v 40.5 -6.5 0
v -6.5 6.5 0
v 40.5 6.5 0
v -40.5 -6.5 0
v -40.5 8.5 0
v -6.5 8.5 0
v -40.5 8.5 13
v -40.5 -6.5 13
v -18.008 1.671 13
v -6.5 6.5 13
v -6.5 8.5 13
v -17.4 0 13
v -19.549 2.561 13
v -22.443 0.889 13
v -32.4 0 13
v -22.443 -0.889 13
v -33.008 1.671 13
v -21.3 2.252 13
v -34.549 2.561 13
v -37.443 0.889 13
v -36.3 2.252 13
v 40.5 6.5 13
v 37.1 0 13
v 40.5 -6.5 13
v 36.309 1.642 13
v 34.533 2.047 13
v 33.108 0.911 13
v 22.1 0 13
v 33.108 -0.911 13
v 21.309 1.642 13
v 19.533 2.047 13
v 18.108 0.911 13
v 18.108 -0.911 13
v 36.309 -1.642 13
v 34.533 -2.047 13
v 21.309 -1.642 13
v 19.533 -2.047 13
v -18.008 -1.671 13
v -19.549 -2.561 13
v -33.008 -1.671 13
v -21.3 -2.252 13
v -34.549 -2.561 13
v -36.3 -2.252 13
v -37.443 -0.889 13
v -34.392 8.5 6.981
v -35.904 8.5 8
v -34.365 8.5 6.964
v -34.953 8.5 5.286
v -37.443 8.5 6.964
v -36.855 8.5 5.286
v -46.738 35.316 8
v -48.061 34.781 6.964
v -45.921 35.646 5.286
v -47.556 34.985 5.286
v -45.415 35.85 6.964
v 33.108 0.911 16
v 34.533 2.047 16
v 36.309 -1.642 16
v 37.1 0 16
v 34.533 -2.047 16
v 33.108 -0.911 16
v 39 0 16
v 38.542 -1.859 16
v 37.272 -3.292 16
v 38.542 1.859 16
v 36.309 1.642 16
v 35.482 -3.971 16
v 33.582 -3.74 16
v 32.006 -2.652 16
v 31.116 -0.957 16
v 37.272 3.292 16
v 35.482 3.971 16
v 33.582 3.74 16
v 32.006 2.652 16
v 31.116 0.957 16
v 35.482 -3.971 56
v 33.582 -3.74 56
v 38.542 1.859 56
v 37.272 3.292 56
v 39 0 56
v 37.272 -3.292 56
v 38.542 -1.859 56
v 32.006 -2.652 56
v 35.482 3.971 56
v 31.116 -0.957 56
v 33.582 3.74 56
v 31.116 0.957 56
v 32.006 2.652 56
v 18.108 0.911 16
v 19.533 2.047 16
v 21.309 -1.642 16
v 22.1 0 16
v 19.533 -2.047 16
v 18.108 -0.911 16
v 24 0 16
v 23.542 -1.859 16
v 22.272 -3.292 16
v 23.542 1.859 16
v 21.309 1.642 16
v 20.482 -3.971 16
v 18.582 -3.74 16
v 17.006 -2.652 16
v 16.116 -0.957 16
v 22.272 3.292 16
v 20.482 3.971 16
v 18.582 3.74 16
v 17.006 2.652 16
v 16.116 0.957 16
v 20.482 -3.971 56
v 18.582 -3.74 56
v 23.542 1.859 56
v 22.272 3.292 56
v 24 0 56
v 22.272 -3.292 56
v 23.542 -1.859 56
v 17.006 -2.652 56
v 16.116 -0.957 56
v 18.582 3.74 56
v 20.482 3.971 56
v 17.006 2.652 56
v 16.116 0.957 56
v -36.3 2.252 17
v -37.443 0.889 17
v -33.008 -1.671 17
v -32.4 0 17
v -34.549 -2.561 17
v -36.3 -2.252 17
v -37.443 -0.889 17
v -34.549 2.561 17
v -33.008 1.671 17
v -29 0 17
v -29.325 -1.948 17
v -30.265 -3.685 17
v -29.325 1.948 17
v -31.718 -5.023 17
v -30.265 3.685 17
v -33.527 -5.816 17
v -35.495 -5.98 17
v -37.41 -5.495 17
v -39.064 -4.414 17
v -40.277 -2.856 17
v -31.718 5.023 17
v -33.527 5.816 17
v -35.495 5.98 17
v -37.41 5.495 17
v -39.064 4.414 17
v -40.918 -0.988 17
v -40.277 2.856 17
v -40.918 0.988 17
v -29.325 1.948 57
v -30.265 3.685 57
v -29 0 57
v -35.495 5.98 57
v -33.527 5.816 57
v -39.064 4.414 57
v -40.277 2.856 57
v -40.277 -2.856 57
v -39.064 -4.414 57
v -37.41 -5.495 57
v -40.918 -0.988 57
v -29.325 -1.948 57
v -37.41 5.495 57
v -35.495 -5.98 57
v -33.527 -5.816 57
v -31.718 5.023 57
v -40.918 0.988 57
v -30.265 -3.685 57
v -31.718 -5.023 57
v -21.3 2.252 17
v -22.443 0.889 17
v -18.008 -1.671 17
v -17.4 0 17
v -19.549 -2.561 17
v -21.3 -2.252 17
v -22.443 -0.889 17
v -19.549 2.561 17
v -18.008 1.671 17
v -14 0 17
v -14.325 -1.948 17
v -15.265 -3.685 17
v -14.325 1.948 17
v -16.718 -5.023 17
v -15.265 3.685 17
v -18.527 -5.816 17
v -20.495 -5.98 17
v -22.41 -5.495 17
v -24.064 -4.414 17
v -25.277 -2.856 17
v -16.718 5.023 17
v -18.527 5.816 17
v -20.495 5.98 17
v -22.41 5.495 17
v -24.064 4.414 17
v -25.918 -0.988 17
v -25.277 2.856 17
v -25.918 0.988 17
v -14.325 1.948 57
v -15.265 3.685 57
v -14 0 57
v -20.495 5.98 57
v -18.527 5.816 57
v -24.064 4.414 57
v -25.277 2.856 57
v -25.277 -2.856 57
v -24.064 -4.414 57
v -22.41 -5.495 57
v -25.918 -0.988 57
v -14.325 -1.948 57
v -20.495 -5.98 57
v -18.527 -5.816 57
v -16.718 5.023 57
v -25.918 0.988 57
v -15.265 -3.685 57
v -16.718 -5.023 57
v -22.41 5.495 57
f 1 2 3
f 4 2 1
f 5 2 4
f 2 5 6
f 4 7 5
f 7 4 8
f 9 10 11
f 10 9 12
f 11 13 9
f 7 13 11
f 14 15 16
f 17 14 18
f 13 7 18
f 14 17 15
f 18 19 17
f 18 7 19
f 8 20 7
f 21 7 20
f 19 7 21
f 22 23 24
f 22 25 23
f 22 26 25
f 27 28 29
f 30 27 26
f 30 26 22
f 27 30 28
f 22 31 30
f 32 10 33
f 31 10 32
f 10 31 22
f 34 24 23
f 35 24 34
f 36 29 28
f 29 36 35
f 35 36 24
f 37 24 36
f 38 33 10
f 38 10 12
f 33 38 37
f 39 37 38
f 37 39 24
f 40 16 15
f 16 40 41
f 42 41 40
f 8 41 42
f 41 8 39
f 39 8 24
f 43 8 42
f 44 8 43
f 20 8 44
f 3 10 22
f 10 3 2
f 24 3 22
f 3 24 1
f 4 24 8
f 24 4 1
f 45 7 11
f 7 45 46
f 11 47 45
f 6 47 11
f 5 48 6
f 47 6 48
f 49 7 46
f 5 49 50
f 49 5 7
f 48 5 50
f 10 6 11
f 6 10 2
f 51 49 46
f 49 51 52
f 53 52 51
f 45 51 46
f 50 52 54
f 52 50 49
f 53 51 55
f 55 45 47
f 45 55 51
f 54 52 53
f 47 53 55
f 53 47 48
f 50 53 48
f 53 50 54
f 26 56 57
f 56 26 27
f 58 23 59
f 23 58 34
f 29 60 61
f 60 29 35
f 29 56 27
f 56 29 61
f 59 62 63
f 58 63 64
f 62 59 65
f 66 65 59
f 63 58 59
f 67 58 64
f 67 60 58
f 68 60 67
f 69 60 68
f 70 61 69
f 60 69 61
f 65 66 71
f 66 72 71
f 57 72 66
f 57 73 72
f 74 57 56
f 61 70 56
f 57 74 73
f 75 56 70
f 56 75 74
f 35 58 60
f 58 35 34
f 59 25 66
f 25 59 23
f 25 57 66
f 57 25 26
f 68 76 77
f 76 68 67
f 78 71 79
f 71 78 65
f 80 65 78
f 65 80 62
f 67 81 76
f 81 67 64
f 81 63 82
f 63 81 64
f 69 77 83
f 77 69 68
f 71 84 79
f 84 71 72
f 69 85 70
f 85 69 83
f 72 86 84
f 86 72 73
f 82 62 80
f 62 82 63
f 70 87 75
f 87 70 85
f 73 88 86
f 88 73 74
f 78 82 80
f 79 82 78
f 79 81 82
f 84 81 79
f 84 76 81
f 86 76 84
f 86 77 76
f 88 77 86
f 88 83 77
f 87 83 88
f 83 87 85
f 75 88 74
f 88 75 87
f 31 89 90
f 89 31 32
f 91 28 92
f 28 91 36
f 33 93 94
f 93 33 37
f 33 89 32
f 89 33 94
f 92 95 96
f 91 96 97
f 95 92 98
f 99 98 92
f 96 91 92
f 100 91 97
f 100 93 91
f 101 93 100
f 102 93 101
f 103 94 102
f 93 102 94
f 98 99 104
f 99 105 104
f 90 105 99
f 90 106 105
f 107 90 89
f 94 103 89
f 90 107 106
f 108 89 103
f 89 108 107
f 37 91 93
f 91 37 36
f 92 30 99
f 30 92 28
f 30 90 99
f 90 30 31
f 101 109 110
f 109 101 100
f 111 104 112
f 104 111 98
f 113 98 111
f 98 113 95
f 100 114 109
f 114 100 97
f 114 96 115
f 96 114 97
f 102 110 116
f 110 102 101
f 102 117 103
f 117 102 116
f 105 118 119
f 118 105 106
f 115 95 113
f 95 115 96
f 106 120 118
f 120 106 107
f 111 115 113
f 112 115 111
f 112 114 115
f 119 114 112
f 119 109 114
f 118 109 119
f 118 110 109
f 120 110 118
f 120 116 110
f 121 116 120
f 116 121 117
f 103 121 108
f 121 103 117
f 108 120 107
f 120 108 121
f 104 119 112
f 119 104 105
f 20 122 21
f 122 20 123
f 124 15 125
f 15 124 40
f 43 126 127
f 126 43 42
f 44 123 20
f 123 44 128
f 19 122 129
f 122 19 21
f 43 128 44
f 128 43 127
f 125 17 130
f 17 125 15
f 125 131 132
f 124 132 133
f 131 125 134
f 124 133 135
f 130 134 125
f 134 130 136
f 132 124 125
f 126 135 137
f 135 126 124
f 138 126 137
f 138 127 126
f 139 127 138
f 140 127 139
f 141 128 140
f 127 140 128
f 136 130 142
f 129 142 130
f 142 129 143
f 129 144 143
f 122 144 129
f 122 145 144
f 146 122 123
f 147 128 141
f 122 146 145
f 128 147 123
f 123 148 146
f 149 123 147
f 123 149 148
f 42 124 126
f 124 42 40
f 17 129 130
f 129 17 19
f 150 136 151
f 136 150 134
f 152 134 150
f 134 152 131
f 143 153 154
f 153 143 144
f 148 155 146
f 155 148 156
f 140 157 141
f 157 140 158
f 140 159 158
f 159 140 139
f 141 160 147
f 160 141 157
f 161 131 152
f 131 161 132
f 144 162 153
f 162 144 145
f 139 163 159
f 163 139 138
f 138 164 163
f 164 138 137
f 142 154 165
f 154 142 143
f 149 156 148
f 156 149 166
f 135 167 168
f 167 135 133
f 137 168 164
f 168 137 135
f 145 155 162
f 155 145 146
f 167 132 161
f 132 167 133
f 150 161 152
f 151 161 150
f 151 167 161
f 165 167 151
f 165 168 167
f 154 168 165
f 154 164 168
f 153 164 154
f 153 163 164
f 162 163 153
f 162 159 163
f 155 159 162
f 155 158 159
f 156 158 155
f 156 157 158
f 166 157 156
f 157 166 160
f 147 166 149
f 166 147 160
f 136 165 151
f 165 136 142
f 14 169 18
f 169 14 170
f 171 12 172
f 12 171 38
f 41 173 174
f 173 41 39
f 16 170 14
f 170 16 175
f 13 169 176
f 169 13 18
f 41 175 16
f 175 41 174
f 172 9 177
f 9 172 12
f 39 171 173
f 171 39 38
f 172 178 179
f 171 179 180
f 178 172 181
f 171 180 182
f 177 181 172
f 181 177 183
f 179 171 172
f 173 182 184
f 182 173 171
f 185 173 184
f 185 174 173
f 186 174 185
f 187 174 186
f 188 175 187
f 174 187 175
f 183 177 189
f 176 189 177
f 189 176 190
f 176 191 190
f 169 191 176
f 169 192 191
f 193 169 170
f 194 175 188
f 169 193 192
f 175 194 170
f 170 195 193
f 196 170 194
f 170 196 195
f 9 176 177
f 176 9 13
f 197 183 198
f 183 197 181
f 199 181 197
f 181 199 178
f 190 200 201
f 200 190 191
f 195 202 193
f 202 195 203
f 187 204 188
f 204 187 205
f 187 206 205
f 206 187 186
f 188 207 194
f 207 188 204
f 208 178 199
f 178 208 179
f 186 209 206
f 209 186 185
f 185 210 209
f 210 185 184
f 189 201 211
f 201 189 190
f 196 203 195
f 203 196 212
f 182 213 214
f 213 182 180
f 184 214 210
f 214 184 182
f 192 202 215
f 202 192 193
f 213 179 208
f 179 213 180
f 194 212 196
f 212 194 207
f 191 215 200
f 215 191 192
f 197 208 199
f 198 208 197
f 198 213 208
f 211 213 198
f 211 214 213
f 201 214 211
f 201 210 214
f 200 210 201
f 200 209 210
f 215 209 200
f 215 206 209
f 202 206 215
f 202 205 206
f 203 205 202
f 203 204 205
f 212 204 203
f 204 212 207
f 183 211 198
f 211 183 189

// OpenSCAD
translate([0,0,20-13/2]) water_bottle_mount($fn=60);
translate([-49.5,(36+4+4)/2,-30-13/2]) rotate([90,0,-90]) edge_mount();
translate([-80/2+3,0,-13/2]) weight_module($fn=30);



module edge_mount() {
    width = 36;
    walls=4;
    difference() {
        linear_extrude(walls+24) square([walls+width+walls, 30+13+walls]);
        linear_extrude(24) square([walls+width+walls, 30]);
        translate([(walls+width+walls)/2,30, -13.8]) rotate([0,90,90]) weight_module_cutout($fn=30);    
        translate([12, 11]) linear_extrude(walls+24+walls) circle(d=4, $fn=30);
        translate([walls+width+walls-12, 11]) linear_extrude(walls+24+walls) circle(d=4, $fn=30);
    }
    translate([walls+width/2,walls+30+0.5,28]) difference() {
        linear_extrude(6) square([walls+width+walls, 25], center=true);
        linear_extrude(3.5+0.2) square([walls+width+walls, 21], center=true);
    }
    
}



module water_bottle_mount() {
    led_cutout = true;
    to92_cutout = true;

    
    difference() {
        union() {
            rotate_extrude($fn=60) bottle_shell_profile($fn=60);
            rotate([180,0,0]) intersection() {
                linear_extrude((23)) circle(d=41+5.4, $fn=60);
                translate([-50/2,0,2]) rotate([0,90,0]) linear_extrude(50) circle(d=41+5.4+2, $fn=60);
            }
            //if(led_cutout) translate([-24,0,-5]) rotate([0,-2,0]) linear_extrude(36) circle(d=4);
        }
        translate([0,0,9]) tube_slot();
        translate([80/-2+3,0,-20]) weight_module_cutout($fn=30);
        translate([0,0,3]) rotate([180,0,0]) linear_extrude(8) intersection() {
            circle(d=41, $fn=60);
            polygon([[0,-5], [0,5],[45, 45], [45, -45]]);
        }
        
        
        // LED cutout
        if (led_cutout) {
            v1 = [47/2,28];
            v2 = [83/2,42/2+18];
            v3 = v1 + (v2-v1)/2;
            echo(v3);
            a = 90-atan2((v2-v1)[0], (v2-v1)[1]);
            translate([-v3[0],0,v3[1]]) rotate([180,a,0]) translate([0,0,-2.9]) linear_extrude(2) square([21,11], center=true);
            translate([-24,0,-8]) rotate([5,-2,0]) linear_extrude(45) circle(d=3);
        }
        
        
        // Dallas temperature cutout
        if (to92_cutout) {

        }
        

    }
}


module weight_module() {
    linear_extrude(13) square([80+1,13],center=true);
}

!weight_module_cutout();

module weight_module_cutout() {
    linear_extrude(13) square([80+1,13],center=true);
    translate([-81/2+34/2, 13/2+2/2]) linear_extrude(13) square([34,2],center=true);
    translate([-81/2+5, 13/2+2/2, 13/2]) rotate([0,-90,-68]) linear_extrude(30) circle(d=3);
    
    translate([80/2-5,0]) linear_extrude(16) circle(d=4.2);
    translate([80/2-5,0,16]) linear_extrude(40) circle(d=8);
    translate([80/2-20,0]) linear_extrude(16) circle(d=4.2);
    translate([80/2-20,0,16]) linear_extrude(40) circle(d=8);
    
    translate([-(80/2-5),0]) linear_extrude(17) circle(d=5.2);
    translate([-(80/2-5),0,17]) linear_extrude(40) circle(d=12);
    translate([-(80/2-20),0]) linear_extrude(17) circle(d=5.2);
    translate([-(80/2-20),0,17]) linear_extrude(40) circle(d=12);
}


module tube_slot(angle=27.5) {
    //rotate([90,0,0]) translate([0,0,-9/2])  linear_extrude(9) square([46.18,88.7]);
    translate([0,9/2]) rotate([90,0,0]) linear_extrude(9) square([82,100]);
    intersection() {
        translate([0,9/2,-50]) rotate([90,0,0]) linear_extrude(9) square([82,50]);
        rotate([0,90+angle,0]) linear_extrude(95) {
            circle(d=9);
            translate([-50,0]) square([50*2,9], center=true) ;
        }
    }
}



module bottle_shell_profile() {
    intersection() {
        square([83/2+3,60+3]);
        translate([0,3]) difference() {
            offset(delta=3) bottle_profile();
            bottle_profile();
        }
    }
}

module bottle_profile() polygon([[0,0],[41/2, 0],[47/2,28], [83/2, 42/2+18], [83/2,60], [0,60]]);
